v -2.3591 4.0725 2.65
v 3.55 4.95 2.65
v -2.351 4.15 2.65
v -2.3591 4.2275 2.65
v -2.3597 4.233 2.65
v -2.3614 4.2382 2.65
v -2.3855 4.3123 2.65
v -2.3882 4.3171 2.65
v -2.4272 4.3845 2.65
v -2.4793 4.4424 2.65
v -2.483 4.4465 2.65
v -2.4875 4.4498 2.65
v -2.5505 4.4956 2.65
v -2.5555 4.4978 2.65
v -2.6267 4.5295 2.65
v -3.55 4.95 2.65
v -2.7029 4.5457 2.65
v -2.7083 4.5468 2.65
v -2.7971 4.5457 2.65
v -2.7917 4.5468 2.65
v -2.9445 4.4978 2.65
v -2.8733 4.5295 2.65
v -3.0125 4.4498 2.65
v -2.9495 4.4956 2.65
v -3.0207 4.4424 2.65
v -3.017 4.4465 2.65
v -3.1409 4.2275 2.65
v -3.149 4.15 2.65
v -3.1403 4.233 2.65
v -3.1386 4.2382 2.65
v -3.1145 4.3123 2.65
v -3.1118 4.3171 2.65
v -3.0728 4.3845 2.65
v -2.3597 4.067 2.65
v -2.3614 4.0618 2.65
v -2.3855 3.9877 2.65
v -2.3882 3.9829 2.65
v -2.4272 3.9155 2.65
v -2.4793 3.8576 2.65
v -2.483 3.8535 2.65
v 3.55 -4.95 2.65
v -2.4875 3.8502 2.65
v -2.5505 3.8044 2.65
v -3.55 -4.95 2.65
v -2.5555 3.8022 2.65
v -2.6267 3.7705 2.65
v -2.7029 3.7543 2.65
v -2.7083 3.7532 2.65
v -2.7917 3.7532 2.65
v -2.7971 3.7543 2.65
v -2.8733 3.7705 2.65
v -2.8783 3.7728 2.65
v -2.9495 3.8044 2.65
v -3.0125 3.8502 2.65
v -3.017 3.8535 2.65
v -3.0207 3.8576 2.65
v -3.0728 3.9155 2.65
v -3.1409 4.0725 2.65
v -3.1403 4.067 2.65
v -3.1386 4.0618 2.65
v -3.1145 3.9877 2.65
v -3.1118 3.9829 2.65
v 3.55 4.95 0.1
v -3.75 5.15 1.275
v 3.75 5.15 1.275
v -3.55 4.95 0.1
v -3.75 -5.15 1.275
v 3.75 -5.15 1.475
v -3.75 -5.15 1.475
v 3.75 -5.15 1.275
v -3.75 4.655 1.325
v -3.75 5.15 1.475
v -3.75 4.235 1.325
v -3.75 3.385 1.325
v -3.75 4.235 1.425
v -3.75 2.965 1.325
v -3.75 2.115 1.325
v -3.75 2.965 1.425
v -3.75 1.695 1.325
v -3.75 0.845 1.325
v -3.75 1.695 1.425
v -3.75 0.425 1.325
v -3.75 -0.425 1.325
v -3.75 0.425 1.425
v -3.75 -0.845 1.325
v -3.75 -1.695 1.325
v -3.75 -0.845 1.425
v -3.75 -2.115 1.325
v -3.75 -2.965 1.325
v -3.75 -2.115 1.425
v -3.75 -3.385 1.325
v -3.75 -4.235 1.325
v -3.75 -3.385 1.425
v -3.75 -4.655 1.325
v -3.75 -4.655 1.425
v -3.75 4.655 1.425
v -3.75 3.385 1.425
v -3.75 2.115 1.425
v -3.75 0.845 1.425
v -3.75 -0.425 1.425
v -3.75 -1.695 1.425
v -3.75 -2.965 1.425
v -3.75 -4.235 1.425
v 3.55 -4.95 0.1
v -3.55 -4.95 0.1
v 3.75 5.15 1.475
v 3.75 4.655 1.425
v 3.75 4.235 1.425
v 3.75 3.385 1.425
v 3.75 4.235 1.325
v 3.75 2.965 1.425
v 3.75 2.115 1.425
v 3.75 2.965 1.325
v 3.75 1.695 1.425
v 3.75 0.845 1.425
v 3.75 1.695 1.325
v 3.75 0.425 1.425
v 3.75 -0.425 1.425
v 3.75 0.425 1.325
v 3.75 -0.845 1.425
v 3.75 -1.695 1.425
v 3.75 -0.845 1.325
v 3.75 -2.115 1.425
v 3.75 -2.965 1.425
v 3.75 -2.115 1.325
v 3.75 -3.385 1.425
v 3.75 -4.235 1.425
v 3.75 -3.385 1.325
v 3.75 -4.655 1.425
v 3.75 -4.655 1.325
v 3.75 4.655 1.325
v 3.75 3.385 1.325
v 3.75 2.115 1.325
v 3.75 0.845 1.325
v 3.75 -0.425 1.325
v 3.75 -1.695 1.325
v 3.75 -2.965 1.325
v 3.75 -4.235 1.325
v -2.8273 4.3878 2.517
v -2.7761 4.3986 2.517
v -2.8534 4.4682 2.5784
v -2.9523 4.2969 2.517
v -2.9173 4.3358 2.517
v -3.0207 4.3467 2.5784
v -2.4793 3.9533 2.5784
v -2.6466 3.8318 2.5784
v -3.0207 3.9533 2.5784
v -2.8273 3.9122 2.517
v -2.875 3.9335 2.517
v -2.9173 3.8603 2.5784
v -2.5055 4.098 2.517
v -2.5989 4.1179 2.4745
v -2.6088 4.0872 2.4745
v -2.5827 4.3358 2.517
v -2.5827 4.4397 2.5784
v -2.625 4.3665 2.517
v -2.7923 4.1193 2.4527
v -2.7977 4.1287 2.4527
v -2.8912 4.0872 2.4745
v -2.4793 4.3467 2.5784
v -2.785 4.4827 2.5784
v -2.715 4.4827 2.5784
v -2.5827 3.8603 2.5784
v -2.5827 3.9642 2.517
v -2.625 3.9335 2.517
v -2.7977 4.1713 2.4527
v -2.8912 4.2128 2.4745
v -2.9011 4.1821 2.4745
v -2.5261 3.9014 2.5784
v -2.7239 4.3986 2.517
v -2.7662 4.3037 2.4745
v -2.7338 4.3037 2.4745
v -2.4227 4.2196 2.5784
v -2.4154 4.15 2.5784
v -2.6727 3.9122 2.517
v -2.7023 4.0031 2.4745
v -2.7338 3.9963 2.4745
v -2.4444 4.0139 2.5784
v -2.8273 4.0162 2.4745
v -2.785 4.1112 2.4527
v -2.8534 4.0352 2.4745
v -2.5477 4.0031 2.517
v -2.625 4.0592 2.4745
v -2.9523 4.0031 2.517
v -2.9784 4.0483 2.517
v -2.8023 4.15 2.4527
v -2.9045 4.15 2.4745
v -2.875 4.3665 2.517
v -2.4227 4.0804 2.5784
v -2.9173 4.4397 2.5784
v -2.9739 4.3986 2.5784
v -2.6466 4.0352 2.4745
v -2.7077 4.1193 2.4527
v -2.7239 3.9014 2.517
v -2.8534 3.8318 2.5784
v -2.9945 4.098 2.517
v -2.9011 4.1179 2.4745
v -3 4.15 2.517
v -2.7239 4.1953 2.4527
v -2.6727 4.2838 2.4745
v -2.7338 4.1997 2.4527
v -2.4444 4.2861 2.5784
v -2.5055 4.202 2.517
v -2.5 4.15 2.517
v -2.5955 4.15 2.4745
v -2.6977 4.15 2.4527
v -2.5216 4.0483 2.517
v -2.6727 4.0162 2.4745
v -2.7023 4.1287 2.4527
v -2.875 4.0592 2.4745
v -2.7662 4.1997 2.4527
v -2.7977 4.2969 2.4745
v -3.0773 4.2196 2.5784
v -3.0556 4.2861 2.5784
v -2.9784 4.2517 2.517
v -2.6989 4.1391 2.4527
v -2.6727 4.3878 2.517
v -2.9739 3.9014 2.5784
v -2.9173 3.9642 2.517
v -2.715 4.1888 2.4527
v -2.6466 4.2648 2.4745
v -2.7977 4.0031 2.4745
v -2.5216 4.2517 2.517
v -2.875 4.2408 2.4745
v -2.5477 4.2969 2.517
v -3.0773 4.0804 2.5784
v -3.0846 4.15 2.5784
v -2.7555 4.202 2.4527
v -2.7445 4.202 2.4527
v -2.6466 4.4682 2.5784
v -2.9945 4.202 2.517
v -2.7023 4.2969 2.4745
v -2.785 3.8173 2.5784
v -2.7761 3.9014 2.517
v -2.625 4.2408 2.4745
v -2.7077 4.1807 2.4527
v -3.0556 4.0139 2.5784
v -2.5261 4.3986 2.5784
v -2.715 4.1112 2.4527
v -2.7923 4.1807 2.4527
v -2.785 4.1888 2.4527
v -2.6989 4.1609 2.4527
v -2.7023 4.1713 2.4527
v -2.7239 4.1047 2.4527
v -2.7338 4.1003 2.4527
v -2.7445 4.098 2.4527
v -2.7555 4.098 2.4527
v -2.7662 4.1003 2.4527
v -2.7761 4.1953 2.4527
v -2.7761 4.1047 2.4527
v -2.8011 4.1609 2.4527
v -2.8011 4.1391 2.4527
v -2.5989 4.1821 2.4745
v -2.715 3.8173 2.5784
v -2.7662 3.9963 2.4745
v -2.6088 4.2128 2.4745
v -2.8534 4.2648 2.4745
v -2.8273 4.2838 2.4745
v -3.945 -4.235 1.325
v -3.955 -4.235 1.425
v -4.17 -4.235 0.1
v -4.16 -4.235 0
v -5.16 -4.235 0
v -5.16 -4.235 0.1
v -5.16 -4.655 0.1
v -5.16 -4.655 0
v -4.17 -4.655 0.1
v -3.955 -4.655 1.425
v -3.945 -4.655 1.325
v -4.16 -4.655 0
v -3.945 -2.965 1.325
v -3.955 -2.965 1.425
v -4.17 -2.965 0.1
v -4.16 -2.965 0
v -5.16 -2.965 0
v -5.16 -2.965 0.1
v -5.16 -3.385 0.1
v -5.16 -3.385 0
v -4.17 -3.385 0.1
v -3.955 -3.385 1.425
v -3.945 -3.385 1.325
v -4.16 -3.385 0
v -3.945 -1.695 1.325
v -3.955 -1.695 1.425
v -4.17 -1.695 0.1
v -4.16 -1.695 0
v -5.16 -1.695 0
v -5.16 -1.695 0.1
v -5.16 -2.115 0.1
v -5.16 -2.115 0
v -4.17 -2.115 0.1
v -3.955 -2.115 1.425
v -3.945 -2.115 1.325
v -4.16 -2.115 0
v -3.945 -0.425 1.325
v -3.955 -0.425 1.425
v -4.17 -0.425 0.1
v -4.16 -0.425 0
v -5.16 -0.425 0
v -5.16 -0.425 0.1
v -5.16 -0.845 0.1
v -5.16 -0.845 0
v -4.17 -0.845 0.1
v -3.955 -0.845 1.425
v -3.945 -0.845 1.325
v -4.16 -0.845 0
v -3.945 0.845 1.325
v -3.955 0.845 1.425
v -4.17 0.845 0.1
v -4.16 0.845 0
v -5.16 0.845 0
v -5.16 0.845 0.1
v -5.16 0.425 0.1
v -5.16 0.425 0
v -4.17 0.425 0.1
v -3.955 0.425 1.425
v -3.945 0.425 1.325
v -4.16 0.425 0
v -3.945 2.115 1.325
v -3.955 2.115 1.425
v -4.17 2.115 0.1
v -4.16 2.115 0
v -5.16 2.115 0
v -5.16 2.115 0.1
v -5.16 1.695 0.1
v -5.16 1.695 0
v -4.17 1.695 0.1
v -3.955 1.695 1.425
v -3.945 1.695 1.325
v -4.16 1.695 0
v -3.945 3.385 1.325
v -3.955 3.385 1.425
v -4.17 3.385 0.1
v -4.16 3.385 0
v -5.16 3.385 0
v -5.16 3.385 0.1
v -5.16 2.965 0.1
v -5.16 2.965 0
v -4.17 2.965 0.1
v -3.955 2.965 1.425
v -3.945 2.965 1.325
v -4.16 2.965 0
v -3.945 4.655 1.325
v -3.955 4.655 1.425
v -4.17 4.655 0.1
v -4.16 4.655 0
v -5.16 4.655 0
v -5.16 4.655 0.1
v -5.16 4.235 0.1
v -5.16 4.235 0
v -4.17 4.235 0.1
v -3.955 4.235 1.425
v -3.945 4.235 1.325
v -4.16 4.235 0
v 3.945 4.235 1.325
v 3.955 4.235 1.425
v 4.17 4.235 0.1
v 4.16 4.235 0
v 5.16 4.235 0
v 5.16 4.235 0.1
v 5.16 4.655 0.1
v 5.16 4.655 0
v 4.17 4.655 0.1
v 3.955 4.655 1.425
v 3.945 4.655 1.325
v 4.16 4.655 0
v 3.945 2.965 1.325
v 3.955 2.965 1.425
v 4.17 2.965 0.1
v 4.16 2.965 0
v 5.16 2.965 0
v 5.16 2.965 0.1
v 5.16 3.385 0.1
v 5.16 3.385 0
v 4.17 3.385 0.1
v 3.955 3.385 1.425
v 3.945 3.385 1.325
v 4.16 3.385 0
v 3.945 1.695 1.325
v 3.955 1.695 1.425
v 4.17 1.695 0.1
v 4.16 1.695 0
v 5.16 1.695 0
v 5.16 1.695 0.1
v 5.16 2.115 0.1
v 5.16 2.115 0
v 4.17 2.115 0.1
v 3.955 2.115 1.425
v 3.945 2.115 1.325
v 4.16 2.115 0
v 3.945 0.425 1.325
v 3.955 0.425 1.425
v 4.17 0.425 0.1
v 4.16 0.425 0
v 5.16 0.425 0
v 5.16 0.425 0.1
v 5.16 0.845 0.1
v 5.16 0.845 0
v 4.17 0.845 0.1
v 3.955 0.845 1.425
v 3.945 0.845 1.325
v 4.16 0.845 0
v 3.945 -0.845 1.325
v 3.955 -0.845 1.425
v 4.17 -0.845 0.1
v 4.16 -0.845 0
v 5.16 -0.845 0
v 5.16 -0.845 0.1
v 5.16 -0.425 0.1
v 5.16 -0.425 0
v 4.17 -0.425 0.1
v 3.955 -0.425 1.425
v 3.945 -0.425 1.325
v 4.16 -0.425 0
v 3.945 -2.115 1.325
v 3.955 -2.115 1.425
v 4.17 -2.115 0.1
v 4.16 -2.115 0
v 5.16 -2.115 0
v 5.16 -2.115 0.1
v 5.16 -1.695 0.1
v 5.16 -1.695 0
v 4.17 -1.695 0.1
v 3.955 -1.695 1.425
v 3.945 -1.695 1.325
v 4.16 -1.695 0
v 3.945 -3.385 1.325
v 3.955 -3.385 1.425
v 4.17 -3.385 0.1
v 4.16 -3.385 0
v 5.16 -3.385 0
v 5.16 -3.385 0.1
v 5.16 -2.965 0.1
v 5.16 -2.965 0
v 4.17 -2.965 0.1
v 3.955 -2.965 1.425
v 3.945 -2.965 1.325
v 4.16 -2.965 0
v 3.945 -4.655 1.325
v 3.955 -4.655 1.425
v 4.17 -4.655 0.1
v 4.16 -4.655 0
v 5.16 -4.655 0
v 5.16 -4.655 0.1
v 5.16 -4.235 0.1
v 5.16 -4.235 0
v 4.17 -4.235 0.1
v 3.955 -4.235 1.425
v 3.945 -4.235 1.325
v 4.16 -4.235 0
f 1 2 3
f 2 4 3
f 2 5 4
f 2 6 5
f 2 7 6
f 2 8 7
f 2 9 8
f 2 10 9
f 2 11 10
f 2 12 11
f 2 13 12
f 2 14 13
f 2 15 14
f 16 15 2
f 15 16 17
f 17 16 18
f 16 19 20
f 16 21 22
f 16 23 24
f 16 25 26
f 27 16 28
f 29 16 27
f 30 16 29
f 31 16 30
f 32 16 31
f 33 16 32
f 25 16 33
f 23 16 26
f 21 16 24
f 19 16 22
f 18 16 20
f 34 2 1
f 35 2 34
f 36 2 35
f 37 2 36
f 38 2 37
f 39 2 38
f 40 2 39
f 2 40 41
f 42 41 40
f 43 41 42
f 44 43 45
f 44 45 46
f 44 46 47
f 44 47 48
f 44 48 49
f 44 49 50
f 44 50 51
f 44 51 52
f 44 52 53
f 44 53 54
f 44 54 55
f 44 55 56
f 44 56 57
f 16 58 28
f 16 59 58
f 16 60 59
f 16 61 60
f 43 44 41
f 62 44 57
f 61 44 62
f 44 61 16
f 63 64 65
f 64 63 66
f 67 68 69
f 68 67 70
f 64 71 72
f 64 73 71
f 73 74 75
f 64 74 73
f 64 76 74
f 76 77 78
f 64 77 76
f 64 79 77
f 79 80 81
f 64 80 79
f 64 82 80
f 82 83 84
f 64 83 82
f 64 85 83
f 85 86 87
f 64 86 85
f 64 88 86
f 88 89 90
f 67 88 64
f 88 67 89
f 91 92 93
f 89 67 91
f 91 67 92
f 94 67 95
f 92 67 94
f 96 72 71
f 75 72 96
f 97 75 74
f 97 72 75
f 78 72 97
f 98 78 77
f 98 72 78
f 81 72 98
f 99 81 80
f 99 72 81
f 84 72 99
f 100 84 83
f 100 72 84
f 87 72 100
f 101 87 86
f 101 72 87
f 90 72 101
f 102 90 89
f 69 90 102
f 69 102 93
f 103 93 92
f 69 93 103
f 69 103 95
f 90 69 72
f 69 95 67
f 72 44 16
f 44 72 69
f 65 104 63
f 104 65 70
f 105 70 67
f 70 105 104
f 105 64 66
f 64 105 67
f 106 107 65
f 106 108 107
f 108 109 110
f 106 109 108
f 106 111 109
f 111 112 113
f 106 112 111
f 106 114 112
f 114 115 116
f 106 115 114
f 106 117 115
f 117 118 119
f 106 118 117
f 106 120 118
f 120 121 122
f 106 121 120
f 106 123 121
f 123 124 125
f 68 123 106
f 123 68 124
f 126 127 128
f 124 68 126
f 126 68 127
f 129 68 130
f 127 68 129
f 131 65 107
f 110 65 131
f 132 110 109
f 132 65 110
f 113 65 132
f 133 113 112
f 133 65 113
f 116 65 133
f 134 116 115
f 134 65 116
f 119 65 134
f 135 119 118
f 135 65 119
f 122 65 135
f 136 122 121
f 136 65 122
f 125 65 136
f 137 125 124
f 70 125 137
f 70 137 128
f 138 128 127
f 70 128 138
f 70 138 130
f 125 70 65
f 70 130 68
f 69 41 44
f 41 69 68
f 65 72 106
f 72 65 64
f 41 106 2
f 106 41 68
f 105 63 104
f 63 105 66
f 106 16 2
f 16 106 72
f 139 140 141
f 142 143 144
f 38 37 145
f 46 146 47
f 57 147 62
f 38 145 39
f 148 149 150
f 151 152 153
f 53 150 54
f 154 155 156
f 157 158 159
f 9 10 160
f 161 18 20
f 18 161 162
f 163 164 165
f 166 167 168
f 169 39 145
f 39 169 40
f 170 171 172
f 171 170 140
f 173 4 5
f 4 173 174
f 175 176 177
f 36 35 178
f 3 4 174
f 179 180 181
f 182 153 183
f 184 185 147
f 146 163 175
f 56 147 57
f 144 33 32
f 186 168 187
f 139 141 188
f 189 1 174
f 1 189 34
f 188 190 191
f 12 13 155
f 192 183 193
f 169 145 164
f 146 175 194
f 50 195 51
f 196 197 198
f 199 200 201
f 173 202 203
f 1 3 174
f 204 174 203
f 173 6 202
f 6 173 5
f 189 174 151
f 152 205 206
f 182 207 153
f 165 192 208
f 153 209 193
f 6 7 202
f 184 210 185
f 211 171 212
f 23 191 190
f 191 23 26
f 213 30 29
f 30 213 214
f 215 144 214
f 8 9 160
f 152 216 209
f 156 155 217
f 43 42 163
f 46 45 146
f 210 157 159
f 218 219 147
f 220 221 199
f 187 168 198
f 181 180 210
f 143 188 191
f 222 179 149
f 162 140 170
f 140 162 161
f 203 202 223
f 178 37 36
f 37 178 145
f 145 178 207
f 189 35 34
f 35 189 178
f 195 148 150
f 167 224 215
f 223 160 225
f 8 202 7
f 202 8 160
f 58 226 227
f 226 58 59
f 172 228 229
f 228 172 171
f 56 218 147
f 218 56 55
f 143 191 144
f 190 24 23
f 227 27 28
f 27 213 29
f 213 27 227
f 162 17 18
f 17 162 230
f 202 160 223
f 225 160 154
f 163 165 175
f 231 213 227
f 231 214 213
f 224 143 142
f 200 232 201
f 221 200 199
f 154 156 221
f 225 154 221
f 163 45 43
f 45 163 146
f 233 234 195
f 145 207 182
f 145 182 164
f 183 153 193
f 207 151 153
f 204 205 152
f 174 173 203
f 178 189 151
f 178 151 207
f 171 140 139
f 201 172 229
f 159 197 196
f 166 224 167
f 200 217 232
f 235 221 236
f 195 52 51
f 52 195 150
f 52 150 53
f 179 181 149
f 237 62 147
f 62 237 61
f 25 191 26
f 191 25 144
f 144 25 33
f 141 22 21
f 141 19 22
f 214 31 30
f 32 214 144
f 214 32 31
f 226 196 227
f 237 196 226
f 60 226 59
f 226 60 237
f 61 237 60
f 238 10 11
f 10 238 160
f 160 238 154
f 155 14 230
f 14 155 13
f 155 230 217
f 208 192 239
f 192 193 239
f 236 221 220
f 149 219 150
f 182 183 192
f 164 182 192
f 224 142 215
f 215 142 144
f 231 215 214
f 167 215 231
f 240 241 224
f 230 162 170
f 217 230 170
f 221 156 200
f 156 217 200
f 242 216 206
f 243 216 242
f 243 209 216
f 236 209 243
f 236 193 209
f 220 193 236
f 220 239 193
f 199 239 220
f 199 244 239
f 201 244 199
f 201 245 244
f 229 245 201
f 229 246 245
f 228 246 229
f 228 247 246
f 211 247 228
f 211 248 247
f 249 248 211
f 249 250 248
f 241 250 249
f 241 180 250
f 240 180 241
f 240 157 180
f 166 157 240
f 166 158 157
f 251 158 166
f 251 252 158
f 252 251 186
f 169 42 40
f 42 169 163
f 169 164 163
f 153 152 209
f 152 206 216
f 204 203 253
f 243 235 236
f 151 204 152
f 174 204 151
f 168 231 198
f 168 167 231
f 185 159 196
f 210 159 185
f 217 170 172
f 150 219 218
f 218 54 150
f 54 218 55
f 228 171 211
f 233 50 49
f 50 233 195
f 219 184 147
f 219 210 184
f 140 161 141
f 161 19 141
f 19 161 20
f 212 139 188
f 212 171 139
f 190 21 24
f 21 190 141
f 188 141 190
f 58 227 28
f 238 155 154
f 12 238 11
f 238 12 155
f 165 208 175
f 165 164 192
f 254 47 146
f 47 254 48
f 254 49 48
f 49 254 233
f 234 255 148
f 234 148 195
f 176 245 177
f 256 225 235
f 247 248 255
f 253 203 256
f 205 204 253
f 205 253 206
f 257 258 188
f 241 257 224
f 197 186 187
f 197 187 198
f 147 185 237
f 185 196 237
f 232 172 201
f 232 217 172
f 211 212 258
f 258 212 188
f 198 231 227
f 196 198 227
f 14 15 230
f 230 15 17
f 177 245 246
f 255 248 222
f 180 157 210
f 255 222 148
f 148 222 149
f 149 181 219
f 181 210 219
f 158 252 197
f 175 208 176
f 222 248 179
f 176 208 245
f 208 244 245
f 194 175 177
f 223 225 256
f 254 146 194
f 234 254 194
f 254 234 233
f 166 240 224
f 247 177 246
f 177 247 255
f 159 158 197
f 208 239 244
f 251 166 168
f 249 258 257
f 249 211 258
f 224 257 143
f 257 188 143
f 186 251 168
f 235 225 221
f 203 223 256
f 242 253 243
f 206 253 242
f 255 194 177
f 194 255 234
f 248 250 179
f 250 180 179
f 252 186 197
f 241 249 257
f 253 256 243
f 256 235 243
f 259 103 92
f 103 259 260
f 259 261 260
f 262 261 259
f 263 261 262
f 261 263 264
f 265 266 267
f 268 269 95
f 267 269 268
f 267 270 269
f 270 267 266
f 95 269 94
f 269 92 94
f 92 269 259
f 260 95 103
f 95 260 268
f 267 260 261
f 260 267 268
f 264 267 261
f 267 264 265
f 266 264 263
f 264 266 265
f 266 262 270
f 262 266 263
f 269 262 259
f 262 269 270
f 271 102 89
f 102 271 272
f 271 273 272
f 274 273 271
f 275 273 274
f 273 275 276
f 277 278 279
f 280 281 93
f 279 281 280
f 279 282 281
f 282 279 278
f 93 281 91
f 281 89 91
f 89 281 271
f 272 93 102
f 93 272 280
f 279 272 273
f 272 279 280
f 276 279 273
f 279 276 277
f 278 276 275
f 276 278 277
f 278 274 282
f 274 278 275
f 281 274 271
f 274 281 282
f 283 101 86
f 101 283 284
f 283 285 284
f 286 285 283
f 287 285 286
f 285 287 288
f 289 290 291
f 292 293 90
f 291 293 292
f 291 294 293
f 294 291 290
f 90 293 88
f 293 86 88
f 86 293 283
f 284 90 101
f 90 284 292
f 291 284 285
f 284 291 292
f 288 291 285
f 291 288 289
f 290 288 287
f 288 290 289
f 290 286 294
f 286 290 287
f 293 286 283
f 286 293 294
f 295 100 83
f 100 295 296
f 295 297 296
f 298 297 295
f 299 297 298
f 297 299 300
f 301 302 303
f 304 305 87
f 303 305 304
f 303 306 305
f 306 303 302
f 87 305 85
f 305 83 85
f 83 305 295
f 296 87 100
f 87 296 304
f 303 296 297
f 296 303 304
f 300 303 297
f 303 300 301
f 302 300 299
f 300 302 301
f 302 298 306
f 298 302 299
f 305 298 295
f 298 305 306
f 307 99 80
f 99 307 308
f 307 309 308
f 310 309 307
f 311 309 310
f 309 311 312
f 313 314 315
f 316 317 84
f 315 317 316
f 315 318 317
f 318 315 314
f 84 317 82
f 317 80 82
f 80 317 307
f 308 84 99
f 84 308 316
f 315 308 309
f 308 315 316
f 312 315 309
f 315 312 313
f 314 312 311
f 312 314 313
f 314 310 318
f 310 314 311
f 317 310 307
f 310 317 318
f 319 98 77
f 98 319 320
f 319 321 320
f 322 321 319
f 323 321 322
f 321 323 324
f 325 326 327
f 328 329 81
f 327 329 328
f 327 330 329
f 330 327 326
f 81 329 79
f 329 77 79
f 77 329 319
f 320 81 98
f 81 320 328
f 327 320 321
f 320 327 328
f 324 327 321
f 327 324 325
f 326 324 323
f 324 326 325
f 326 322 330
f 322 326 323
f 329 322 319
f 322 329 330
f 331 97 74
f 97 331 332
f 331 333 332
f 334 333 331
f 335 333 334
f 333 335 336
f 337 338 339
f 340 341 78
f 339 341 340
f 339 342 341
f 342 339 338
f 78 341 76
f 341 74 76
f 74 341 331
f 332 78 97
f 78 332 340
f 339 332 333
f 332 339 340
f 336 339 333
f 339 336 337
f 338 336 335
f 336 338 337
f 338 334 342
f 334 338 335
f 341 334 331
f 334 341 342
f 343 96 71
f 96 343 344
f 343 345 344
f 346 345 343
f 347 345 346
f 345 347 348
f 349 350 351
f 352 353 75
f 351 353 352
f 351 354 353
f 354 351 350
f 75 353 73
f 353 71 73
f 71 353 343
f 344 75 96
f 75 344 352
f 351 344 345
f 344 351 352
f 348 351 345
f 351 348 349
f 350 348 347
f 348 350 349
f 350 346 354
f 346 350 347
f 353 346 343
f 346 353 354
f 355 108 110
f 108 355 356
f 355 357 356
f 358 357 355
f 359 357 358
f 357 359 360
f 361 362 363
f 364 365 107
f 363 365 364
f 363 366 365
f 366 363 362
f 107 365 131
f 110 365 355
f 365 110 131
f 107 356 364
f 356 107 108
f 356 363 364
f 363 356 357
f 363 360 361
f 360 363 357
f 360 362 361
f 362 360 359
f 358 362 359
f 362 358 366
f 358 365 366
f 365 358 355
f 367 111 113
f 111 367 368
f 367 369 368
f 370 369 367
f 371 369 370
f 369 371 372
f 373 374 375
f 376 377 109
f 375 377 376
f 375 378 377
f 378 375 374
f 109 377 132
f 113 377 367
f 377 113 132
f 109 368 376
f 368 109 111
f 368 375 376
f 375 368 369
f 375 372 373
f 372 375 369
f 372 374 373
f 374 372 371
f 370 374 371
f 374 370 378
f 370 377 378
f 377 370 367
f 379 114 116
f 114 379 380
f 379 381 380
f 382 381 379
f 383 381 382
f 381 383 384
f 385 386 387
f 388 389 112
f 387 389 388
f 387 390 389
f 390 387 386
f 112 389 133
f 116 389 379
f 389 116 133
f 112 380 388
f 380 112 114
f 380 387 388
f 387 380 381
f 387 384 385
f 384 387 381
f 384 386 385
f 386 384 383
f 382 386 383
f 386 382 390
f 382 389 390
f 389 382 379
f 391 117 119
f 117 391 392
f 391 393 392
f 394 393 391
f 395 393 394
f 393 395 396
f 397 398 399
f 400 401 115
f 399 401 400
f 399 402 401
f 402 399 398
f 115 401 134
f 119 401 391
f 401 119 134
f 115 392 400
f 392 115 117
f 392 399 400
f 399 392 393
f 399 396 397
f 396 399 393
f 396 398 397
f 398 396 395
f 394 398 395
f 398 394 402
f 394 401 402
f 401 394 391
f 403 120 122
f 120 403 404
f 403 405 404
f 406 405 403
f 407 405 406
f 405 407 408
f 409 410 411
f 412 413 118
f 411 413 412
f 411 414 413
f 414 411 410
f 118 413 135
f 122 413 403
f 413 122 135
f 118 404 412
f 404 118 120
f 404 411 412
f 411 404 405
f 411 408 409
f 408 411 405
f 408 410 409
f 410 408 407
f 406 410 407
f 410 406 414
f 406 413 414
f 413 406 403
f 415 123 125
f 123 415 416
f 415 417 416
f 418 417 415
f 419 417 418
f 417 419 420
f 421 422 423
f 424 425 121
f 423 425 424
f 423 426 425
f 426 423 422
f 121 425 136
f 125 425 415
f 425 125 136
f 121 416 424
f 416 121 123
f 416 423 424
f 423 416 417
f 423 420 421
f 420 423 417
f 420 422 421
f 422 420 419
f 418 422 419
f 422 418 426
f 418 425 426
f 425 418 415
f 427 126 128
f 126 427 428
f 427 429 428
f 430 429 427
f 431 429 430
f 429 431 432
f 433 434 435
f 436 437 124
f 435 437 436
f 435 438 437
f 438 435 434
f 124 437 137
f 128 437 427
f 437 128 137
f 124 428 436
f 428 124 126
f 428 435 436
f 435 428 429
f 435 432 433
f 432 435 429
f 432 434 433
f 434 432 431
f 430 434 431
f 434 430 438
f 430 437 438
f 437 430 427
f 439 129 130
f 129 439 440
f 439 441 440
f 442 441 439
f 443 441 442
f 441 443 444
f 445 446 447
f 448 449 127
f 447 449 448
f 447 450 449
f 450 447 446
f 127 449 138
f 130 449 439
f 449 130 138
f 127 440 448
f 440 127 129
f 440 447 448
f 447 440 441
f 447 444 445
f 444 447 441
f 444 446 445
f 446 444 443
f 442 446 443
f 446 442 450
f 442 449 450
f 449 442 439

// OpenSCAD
// file: proto/soic.scad
/*
OpenSCAD Model:  Small Outline IC

  N  - number of pins
  L  - width, including pads
  P  - pitch
  W  - width of pad
  H  - total height
  T  - toe length
  A  - body width
  B  - body height
  K  - elevation
  padcolor - color of pads
  bodycolor - color of plastic body
  simple - 0 = realistic model, 1 = simplified model

*/

module soic(
	N=14,
	L=6.4,
	P=0.65,
	W=0.25,
	H=1.2,
	T=0.624,
	A=4.4,
	B=5,
	K=0.1,
	padcolor=[0.9,0.9,0.9],
	bodycolor=[0.2,0.2,0.2],
	simple=0
) {

	module soicpadblock(n)	{
		x=0.01;
		color(padcolor) for (i=[0:n-1]) {
			translate ([0,-(n-1)/2*P+i*P+W/2,0])  rotate(90,[1,0,0]) linear_extrude(height=W) polygon(
				[[0,0],[0,0.1],[T-x,0.1],[T+((L-A)/2-T)/2,(H-K)/2+0.05+K],[(L-A)/2+0.05,(H-K)/2+0.05+K],
				 [(L-A)/2+0.05,(H-K)/2-0.05+K],[T+((L-A)/2-T)/2+x,(H-K)/2-0.05+K],[T,0]]
			);
		}
	}

	color(bodycolor) {
		translate([0,0,(H-K)/2+K]) {
			difference() {
			if (simple) {
				cube([A,B,H-K],center=true);
			} else {
				polyhedron(
					[[-A/2+0.2,B/2-0.2,(H-K)/2],[A/2-0.2,B/2-0.2,(H-K)/2],[A/2-0.2,-B/2+0.2,(H-K)/2],[-A/2+0.2,-B/2+0.2,(H-K)/2],
					 [-A/2,B/2,0.1],[A/2,B/2,0.1],[A/2,-B/2,0.1],[-A/2,-B/2,0.1],
					 [-A/2,B/2,-0.1],[A/2,B/2,-0.1],[A/2,-B/2,-0.1],[-A/2,-B/2,-0.1],
					 [-A/2+0.2,B/2-0.2,-(H-K)/2],[A/2-0.2,B/2-0.2,-(H-K)/2],[A/2-0.2,-B/2+0.2,-(H-K)/2],[-A/2+0.2,-B/2+0.2,-(H-K)/2]],
					[
					[0,1,2],[2,3,0],[14,13,12],[12,15,14],
					[0,4,5],[5,1,0],[1,5,6],[6,2,1],[2,6,7],[7,3,2],[3,7,4],[4,0,3],
					[4,8,9],[9,5,4],[5,9,10],[10,6,5],[6,10,11],[11,7,6],[11,8,4],[4,7,11],
					[8,12,13],[13,9,8],[9,13,14],[14,10,9],[10,14,15],[15,11,10],[11,15,12],[12,8,11],
					]
				);
			}
			translate([-A/2+1,B/2-1,(H-K)/2+0.3]) sphere(r=0.5,$fn=30);
			}
		}
	}

	translate([-L/2,0,0]) soicpadblock(N/2);
	translate([L/2,0,0]) rotate(180,[0,0,1]) soicpadblock(N/2);
}
// main file
include <proto/soic.scad>

soic(
	N=16,
	L=10.32,
	P=1.27,
	W=0.42,
	H=2.65,
	T=1.0,
	A=7.5,
	B=10.3,
	K=0.1
);
